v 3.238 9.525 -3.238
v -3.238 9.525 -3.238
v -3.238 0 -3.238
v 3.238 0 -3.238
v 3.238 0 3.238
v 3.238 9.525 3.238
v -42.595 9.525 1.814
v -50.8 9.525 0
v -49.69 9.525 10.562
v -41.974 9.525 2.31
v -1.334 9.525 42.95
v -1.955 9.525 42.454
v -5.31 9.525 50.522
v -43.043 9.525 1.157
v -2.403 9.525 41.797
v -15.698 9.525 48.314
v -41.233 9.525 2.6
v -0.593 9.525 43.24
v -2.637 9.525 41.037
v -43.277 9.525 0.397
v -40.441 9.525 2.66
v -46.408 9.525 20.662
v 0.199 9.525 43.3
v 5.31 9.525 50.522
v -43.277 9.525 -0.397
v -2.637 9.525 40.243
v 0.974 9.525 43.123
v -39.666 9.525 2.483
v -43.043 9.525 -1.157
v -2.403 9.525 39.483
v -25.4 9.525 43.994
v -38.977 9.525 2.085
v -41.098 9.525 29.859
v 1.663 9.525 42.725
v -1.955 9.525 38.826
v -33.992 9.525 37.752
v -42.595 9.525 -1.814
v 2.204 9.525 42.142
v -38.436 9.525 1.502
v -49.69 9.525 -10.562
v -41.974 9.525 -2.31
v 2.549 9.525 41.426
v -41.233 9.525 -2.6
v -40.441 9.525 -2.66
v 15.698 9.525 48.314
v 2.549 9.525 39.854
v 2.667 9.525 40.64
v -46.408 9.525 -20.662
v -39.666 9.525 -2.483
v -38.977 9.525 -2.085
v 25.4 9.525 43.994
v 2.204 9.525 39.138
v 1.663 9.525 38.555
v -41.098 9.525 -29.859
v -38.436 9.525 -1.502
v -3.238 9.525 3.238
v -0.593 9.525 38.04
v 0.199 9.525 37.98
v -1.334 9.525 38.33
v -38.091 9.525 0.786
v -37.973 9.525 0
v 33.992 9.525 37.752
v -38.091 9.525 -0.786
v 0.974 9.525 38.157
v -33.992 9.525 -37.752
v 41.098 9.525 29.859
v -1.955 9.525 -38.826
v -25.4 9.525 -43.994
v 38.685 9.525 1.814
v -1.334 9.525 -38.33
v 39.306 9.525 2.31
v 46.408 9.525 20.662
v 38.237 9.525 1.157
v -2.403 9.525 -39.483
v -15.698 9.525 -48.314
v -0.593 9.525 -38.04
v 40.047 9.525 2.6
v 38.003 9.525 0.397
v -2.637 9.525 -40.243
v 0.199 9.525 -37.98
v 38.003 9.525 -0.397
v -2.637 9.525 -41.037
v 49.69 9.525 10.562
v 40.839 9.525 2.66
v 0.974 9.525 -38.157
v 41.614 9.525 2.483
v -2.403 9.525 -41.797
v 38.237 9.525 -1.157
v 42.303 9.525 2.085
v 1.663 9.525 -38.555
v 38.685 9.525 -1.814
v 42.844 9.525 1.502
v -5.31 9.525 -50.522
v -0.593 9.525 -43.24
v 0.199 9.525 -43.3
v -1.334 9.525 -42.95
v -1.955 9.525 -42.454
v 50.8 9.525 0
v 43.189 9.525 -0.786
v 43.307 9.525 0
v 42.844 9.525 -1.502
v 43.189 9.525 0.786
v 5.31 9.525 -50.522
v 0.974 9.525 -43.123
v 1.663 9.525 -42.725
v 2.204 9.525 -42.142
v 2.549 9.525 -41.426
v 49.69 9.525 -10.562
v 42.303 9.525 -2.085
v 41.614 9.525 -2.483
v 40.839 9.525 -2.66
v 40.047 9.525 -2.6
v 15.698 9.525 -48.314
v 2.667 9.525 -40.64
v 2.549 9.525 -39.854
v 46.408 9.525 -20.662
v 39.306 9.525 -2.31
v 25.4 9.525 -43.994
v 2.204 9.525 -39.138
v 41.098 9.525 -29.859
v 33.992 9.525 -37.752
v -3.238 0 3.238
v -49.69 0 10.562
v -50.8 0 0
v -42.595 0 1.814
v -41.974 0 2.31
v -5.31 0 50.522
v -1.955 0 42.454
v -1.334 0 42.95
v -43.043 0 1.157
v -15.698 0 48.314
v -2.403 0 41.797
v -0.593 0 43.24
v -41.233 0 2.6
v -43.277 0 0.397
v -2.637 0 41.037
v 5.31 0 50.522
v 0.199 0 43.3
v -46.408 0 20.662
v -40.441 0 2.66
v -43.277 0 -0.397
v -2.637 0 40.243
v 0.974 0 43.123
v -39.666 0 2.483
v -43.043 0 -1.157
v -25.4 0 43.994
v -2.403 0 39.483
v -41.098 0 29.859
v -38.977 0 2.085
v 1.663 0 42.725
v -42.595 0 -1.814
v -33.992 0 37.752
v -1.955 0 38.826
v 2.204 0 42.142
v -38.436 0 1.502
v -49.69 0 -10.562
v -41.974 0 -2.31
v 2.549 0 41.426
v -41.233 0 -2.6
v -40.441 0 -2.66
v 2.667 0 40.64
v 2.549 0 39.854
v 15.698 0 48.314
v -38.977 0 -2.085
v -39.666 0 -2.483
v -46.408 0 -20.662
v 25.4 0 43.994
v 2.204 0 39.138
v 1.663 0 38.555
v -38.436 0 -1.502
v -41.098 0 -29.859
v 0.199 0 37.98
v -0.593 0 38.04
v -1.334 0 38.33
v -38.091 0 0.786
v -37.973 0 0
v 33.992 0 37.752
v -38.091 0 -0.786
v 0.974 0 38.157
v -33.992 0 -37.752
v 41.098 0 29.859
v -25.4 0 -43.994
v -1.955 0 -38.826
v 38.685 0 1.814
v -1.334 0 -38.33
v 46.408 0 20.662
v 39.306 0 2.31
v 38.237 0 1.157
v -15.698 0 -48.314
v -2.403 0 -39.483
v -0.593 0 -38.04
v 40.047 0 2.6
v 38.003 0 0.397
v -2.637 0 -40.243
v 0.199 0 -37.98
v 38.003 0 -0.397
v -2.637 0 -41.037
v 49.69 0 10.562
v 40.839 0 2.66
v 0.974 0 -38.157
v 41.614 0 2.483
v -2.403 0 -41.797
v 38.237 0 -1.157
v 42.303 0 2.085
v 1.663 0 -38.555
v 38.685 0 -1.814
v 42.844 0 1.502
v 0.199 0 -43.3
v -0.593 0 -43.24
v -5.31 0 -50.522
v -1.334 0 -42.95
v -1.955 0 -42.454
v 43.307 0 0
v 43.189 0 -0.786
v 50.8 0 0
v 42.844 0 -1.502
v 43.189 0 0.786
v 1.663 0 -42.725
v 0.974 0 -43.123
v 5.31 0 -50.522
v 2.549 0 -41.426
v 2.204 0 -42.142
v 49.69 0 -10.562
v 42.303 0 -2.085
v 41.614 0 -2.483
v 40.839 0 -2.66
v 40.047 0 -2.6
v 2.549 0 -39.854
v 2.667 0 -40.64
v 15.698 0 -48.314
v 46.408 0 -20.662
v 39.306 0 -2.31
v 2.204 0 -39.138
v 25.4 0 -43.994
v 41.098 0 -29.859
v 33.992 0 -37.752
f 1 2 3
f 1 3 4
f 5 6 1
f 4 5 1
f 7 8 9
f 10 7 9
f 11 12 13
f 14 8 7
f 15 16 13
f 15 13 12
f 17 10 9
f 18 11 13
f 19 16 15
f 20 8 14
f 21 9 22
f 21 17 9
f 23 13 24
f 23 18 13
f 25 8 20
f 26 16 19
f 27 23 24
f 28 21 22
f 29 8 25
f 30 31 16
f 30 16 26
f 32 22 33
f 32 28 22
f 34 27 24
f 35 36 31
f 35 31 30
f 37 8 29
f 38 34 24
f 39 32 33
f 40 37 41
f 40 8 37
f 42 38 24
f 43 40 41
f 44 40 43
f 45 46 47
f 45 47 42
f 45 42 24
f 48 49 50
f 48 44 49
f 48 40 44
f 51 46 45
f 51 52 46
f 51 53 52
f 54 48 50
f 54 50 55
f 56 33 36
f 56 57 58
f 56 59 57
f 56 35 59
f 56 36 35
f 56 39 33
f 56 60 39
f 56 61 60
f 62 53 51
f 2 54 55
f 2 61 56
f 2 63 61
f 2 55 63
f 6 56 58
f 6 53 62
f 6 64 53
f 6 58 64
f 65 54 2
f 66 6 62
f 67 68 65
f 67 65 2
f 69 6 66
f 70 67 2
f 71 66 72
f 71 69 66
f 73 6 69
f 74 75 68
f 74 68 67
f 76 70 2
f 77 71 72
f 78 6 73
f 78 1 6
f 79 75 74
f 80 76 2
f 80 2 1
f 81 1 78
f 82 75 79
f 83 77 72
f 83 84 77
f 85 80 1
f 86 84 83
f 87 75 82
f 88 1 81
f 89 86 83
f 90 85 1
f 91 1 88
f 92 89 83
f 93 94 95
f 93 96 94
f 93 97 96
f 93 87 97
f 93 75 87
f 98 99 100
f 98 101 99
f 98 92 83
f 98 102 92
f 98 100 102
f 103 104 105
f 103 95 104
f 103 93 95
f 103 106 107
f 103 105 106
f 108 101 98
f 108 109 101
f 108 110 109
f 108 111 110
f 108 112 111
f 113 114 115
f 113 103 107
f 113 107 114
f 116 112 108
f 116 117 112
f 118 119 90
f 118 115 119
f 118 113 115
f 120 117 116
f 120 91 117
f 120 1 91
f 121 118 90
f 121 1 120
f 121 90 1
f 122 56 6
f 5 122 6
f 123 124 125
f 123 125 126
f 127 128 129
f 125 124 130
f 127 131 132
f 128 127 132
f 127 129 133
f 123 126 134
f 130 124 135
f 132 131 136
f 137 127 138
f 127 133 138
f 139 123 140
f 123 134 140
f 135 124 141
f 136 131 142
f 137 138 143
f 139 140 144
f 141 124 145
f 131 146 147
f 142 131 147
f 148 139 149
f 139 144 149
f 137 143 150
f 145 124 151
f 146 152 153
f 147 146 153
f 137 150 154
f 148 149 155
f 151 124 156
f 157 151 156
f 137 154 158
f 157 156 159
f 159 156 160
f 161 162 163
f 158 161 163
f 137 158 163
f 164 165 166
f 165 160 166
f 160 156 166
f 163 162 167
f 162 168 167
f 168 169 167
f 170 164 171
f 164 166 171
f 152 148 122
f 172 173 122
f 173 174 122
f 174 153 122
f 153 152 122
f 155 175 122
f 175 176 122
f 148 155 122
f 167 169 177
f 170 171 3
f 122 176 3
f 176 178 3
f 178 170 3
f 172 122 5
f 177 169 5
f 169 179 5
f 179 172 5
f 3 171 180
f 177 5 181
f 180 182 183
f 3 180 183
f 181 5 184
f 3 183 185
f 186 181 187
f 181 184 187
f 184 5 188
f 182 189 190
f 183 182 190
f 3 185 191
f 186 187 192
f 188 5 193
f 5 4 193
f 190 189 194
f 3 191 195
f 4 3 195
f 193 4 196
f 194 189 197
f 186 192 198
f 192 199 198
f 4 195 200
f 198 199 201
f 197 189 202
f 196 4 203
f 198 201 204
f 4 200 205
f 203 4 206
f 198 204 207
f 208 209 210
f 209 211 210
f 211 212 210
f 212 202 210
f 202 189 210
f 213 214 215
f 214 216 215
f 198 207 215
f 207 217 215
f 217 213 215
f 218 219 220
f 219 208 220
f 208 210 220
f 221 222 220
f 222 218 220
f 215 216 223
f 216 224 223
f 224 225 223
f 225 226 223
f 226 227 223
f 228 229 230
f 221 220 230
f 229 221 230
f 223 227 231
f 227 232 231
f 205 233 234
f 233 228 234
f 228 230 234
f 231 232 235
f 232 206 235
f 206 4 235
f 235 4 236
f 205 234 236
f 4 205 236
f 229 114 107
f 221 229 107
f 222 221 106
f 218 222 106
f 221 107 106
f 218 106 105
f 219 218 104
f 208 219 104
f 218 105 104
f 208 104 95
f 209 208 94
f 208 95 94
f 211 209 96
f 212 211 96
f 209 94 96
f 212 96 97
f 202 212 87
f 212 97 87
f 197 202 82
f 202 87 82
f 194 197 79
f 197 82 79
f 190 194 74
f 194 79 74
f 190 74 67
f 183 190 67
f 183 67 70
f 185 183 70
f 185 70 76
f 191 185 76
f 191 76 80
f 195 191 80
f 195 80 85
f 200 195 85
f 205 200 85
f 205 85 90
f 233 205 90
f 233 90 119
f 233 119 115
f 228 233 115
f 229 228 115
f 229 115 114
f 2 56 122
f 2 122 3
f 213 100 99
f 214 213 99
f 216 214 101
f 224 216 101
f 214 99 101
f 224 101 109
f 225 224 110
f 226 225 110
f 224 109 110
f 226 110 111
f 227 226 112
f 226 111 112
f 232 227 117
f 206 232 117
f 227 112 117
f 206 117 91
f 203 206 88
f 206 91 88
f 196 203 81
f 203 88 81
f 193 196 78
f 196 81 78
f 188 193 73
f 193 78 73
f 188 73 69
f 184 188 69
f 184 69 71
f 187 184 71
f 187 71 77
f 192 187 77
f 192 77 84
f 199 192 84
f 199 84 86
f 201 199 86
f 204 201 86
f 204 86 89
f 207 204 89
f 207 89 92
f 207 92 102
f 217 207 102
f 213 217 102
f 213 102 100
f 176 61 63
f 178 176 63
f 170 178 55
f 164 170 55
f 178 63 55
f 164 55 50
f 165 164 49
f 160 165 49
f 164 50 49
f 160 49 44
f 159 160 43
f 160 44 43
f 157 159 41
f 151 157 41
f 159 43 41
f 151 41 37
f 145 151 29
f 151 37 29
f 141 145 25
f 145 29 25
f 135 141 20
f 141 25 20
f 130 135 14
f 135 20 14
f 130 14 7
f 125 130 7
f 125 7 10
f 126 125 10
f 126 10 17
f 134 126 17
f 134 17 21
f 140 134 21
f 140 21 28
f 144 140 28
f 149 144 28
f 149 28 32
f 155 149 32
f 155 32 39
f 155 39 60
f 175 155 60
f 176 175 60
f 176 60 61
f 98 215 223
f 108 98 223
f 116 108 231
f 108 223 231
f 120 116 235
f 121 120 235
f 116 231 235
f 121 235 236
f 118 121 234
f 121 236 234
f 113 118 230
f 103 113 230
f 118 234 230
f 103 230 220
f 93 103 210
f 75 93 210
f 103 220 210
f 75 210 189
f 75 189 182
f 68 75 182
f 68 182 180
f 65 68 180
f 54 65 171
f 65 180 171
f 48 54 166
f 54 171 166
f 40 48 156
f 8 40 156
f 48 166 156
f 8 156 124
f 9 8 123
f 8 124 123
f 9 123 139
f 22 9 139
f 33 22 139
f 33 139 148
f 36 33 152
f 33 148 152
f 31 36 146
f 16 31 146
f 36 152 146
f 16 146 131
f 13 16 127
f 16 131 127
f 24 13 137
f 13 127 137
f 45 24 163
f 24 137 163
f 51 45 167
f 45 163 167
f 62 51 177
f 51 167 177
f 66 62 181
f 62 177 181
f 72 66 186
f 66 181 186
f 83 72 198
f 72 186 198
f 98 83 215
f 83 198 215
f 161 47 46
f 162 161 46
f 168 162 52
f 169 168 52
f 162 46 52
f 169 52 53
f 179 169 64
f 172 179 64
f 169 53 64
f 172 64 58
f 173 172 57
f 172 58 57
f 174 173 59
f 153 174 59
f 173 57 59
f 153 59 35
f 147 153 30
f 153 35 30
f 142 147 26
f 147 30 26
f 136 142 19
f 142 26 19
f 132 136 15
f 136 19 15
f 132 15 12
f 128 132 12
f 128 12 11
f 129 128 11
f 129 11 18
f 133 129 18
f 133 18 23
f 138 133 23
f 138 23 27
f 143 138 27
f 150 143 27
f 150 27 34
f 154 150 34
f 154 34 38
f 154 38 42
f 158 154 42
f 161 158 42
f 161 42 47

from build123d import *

# Parameters (mm, degrees)
SKETCH2_R           = 50.8
BOSS_EXTRUDE1_DEPTH = 9.525
SKETCH3_R           = 2.667
CUT_EXTRUDE1_DEPTH  = 10.525
SKETCH4_W           = 6.477
SKETCH4_H           = 6.477
CUT_EXTRUDE2_DEPTH  = 10.525


with BuildPart() as part:
    # Sketch2 → Boss-Extrude1 (new body)
    with BuildSketch(Plane(origin=(0, 0, 0), x_dir=(1, 0, 0), z_dir=(0, 1, 0))):
        Circle(SKETCH2_R)
    extrude(amount=BOSS_EXTRUDE1_DEPTH)

    # Sketch3 → Cut-Extrude1 (cut, through all)
    with BuildSketch(Plane(origin=(0, 9.525, 0), x_dir=(1, 0, 0), z_dir=(0, 1, 0))):
        with Locations((0, -40.64)):
            Circle(SKETCH3_R)
        with Locations((-40.64, 0)):
            Circle(SKETCH3_R)
        with Locations((0, 40.64)):
            Circle(SKETCH3_R)
        with Locations((40.64, 0)):
            Circle(SKETCH3_R)
    extrude(amount=-CUT_EXTRUDE1_DEPTH, mode=Mode.SUBTRACT)

    # Sketch4 → Cut-Extrude2 (cut, through all)
    with BuildSketch(Plane(origin=(0, 9.525, 0), x_dir=(1, 0, 0), z_dir=(0, 1, 0))):
        Rectangle(SKETCH4_W, SKETCH4_H)
    extrude(amount=-CUT_EXTRUDE2_DEPTH, mode=Mode.SUBTRACT)


solid = part.part
